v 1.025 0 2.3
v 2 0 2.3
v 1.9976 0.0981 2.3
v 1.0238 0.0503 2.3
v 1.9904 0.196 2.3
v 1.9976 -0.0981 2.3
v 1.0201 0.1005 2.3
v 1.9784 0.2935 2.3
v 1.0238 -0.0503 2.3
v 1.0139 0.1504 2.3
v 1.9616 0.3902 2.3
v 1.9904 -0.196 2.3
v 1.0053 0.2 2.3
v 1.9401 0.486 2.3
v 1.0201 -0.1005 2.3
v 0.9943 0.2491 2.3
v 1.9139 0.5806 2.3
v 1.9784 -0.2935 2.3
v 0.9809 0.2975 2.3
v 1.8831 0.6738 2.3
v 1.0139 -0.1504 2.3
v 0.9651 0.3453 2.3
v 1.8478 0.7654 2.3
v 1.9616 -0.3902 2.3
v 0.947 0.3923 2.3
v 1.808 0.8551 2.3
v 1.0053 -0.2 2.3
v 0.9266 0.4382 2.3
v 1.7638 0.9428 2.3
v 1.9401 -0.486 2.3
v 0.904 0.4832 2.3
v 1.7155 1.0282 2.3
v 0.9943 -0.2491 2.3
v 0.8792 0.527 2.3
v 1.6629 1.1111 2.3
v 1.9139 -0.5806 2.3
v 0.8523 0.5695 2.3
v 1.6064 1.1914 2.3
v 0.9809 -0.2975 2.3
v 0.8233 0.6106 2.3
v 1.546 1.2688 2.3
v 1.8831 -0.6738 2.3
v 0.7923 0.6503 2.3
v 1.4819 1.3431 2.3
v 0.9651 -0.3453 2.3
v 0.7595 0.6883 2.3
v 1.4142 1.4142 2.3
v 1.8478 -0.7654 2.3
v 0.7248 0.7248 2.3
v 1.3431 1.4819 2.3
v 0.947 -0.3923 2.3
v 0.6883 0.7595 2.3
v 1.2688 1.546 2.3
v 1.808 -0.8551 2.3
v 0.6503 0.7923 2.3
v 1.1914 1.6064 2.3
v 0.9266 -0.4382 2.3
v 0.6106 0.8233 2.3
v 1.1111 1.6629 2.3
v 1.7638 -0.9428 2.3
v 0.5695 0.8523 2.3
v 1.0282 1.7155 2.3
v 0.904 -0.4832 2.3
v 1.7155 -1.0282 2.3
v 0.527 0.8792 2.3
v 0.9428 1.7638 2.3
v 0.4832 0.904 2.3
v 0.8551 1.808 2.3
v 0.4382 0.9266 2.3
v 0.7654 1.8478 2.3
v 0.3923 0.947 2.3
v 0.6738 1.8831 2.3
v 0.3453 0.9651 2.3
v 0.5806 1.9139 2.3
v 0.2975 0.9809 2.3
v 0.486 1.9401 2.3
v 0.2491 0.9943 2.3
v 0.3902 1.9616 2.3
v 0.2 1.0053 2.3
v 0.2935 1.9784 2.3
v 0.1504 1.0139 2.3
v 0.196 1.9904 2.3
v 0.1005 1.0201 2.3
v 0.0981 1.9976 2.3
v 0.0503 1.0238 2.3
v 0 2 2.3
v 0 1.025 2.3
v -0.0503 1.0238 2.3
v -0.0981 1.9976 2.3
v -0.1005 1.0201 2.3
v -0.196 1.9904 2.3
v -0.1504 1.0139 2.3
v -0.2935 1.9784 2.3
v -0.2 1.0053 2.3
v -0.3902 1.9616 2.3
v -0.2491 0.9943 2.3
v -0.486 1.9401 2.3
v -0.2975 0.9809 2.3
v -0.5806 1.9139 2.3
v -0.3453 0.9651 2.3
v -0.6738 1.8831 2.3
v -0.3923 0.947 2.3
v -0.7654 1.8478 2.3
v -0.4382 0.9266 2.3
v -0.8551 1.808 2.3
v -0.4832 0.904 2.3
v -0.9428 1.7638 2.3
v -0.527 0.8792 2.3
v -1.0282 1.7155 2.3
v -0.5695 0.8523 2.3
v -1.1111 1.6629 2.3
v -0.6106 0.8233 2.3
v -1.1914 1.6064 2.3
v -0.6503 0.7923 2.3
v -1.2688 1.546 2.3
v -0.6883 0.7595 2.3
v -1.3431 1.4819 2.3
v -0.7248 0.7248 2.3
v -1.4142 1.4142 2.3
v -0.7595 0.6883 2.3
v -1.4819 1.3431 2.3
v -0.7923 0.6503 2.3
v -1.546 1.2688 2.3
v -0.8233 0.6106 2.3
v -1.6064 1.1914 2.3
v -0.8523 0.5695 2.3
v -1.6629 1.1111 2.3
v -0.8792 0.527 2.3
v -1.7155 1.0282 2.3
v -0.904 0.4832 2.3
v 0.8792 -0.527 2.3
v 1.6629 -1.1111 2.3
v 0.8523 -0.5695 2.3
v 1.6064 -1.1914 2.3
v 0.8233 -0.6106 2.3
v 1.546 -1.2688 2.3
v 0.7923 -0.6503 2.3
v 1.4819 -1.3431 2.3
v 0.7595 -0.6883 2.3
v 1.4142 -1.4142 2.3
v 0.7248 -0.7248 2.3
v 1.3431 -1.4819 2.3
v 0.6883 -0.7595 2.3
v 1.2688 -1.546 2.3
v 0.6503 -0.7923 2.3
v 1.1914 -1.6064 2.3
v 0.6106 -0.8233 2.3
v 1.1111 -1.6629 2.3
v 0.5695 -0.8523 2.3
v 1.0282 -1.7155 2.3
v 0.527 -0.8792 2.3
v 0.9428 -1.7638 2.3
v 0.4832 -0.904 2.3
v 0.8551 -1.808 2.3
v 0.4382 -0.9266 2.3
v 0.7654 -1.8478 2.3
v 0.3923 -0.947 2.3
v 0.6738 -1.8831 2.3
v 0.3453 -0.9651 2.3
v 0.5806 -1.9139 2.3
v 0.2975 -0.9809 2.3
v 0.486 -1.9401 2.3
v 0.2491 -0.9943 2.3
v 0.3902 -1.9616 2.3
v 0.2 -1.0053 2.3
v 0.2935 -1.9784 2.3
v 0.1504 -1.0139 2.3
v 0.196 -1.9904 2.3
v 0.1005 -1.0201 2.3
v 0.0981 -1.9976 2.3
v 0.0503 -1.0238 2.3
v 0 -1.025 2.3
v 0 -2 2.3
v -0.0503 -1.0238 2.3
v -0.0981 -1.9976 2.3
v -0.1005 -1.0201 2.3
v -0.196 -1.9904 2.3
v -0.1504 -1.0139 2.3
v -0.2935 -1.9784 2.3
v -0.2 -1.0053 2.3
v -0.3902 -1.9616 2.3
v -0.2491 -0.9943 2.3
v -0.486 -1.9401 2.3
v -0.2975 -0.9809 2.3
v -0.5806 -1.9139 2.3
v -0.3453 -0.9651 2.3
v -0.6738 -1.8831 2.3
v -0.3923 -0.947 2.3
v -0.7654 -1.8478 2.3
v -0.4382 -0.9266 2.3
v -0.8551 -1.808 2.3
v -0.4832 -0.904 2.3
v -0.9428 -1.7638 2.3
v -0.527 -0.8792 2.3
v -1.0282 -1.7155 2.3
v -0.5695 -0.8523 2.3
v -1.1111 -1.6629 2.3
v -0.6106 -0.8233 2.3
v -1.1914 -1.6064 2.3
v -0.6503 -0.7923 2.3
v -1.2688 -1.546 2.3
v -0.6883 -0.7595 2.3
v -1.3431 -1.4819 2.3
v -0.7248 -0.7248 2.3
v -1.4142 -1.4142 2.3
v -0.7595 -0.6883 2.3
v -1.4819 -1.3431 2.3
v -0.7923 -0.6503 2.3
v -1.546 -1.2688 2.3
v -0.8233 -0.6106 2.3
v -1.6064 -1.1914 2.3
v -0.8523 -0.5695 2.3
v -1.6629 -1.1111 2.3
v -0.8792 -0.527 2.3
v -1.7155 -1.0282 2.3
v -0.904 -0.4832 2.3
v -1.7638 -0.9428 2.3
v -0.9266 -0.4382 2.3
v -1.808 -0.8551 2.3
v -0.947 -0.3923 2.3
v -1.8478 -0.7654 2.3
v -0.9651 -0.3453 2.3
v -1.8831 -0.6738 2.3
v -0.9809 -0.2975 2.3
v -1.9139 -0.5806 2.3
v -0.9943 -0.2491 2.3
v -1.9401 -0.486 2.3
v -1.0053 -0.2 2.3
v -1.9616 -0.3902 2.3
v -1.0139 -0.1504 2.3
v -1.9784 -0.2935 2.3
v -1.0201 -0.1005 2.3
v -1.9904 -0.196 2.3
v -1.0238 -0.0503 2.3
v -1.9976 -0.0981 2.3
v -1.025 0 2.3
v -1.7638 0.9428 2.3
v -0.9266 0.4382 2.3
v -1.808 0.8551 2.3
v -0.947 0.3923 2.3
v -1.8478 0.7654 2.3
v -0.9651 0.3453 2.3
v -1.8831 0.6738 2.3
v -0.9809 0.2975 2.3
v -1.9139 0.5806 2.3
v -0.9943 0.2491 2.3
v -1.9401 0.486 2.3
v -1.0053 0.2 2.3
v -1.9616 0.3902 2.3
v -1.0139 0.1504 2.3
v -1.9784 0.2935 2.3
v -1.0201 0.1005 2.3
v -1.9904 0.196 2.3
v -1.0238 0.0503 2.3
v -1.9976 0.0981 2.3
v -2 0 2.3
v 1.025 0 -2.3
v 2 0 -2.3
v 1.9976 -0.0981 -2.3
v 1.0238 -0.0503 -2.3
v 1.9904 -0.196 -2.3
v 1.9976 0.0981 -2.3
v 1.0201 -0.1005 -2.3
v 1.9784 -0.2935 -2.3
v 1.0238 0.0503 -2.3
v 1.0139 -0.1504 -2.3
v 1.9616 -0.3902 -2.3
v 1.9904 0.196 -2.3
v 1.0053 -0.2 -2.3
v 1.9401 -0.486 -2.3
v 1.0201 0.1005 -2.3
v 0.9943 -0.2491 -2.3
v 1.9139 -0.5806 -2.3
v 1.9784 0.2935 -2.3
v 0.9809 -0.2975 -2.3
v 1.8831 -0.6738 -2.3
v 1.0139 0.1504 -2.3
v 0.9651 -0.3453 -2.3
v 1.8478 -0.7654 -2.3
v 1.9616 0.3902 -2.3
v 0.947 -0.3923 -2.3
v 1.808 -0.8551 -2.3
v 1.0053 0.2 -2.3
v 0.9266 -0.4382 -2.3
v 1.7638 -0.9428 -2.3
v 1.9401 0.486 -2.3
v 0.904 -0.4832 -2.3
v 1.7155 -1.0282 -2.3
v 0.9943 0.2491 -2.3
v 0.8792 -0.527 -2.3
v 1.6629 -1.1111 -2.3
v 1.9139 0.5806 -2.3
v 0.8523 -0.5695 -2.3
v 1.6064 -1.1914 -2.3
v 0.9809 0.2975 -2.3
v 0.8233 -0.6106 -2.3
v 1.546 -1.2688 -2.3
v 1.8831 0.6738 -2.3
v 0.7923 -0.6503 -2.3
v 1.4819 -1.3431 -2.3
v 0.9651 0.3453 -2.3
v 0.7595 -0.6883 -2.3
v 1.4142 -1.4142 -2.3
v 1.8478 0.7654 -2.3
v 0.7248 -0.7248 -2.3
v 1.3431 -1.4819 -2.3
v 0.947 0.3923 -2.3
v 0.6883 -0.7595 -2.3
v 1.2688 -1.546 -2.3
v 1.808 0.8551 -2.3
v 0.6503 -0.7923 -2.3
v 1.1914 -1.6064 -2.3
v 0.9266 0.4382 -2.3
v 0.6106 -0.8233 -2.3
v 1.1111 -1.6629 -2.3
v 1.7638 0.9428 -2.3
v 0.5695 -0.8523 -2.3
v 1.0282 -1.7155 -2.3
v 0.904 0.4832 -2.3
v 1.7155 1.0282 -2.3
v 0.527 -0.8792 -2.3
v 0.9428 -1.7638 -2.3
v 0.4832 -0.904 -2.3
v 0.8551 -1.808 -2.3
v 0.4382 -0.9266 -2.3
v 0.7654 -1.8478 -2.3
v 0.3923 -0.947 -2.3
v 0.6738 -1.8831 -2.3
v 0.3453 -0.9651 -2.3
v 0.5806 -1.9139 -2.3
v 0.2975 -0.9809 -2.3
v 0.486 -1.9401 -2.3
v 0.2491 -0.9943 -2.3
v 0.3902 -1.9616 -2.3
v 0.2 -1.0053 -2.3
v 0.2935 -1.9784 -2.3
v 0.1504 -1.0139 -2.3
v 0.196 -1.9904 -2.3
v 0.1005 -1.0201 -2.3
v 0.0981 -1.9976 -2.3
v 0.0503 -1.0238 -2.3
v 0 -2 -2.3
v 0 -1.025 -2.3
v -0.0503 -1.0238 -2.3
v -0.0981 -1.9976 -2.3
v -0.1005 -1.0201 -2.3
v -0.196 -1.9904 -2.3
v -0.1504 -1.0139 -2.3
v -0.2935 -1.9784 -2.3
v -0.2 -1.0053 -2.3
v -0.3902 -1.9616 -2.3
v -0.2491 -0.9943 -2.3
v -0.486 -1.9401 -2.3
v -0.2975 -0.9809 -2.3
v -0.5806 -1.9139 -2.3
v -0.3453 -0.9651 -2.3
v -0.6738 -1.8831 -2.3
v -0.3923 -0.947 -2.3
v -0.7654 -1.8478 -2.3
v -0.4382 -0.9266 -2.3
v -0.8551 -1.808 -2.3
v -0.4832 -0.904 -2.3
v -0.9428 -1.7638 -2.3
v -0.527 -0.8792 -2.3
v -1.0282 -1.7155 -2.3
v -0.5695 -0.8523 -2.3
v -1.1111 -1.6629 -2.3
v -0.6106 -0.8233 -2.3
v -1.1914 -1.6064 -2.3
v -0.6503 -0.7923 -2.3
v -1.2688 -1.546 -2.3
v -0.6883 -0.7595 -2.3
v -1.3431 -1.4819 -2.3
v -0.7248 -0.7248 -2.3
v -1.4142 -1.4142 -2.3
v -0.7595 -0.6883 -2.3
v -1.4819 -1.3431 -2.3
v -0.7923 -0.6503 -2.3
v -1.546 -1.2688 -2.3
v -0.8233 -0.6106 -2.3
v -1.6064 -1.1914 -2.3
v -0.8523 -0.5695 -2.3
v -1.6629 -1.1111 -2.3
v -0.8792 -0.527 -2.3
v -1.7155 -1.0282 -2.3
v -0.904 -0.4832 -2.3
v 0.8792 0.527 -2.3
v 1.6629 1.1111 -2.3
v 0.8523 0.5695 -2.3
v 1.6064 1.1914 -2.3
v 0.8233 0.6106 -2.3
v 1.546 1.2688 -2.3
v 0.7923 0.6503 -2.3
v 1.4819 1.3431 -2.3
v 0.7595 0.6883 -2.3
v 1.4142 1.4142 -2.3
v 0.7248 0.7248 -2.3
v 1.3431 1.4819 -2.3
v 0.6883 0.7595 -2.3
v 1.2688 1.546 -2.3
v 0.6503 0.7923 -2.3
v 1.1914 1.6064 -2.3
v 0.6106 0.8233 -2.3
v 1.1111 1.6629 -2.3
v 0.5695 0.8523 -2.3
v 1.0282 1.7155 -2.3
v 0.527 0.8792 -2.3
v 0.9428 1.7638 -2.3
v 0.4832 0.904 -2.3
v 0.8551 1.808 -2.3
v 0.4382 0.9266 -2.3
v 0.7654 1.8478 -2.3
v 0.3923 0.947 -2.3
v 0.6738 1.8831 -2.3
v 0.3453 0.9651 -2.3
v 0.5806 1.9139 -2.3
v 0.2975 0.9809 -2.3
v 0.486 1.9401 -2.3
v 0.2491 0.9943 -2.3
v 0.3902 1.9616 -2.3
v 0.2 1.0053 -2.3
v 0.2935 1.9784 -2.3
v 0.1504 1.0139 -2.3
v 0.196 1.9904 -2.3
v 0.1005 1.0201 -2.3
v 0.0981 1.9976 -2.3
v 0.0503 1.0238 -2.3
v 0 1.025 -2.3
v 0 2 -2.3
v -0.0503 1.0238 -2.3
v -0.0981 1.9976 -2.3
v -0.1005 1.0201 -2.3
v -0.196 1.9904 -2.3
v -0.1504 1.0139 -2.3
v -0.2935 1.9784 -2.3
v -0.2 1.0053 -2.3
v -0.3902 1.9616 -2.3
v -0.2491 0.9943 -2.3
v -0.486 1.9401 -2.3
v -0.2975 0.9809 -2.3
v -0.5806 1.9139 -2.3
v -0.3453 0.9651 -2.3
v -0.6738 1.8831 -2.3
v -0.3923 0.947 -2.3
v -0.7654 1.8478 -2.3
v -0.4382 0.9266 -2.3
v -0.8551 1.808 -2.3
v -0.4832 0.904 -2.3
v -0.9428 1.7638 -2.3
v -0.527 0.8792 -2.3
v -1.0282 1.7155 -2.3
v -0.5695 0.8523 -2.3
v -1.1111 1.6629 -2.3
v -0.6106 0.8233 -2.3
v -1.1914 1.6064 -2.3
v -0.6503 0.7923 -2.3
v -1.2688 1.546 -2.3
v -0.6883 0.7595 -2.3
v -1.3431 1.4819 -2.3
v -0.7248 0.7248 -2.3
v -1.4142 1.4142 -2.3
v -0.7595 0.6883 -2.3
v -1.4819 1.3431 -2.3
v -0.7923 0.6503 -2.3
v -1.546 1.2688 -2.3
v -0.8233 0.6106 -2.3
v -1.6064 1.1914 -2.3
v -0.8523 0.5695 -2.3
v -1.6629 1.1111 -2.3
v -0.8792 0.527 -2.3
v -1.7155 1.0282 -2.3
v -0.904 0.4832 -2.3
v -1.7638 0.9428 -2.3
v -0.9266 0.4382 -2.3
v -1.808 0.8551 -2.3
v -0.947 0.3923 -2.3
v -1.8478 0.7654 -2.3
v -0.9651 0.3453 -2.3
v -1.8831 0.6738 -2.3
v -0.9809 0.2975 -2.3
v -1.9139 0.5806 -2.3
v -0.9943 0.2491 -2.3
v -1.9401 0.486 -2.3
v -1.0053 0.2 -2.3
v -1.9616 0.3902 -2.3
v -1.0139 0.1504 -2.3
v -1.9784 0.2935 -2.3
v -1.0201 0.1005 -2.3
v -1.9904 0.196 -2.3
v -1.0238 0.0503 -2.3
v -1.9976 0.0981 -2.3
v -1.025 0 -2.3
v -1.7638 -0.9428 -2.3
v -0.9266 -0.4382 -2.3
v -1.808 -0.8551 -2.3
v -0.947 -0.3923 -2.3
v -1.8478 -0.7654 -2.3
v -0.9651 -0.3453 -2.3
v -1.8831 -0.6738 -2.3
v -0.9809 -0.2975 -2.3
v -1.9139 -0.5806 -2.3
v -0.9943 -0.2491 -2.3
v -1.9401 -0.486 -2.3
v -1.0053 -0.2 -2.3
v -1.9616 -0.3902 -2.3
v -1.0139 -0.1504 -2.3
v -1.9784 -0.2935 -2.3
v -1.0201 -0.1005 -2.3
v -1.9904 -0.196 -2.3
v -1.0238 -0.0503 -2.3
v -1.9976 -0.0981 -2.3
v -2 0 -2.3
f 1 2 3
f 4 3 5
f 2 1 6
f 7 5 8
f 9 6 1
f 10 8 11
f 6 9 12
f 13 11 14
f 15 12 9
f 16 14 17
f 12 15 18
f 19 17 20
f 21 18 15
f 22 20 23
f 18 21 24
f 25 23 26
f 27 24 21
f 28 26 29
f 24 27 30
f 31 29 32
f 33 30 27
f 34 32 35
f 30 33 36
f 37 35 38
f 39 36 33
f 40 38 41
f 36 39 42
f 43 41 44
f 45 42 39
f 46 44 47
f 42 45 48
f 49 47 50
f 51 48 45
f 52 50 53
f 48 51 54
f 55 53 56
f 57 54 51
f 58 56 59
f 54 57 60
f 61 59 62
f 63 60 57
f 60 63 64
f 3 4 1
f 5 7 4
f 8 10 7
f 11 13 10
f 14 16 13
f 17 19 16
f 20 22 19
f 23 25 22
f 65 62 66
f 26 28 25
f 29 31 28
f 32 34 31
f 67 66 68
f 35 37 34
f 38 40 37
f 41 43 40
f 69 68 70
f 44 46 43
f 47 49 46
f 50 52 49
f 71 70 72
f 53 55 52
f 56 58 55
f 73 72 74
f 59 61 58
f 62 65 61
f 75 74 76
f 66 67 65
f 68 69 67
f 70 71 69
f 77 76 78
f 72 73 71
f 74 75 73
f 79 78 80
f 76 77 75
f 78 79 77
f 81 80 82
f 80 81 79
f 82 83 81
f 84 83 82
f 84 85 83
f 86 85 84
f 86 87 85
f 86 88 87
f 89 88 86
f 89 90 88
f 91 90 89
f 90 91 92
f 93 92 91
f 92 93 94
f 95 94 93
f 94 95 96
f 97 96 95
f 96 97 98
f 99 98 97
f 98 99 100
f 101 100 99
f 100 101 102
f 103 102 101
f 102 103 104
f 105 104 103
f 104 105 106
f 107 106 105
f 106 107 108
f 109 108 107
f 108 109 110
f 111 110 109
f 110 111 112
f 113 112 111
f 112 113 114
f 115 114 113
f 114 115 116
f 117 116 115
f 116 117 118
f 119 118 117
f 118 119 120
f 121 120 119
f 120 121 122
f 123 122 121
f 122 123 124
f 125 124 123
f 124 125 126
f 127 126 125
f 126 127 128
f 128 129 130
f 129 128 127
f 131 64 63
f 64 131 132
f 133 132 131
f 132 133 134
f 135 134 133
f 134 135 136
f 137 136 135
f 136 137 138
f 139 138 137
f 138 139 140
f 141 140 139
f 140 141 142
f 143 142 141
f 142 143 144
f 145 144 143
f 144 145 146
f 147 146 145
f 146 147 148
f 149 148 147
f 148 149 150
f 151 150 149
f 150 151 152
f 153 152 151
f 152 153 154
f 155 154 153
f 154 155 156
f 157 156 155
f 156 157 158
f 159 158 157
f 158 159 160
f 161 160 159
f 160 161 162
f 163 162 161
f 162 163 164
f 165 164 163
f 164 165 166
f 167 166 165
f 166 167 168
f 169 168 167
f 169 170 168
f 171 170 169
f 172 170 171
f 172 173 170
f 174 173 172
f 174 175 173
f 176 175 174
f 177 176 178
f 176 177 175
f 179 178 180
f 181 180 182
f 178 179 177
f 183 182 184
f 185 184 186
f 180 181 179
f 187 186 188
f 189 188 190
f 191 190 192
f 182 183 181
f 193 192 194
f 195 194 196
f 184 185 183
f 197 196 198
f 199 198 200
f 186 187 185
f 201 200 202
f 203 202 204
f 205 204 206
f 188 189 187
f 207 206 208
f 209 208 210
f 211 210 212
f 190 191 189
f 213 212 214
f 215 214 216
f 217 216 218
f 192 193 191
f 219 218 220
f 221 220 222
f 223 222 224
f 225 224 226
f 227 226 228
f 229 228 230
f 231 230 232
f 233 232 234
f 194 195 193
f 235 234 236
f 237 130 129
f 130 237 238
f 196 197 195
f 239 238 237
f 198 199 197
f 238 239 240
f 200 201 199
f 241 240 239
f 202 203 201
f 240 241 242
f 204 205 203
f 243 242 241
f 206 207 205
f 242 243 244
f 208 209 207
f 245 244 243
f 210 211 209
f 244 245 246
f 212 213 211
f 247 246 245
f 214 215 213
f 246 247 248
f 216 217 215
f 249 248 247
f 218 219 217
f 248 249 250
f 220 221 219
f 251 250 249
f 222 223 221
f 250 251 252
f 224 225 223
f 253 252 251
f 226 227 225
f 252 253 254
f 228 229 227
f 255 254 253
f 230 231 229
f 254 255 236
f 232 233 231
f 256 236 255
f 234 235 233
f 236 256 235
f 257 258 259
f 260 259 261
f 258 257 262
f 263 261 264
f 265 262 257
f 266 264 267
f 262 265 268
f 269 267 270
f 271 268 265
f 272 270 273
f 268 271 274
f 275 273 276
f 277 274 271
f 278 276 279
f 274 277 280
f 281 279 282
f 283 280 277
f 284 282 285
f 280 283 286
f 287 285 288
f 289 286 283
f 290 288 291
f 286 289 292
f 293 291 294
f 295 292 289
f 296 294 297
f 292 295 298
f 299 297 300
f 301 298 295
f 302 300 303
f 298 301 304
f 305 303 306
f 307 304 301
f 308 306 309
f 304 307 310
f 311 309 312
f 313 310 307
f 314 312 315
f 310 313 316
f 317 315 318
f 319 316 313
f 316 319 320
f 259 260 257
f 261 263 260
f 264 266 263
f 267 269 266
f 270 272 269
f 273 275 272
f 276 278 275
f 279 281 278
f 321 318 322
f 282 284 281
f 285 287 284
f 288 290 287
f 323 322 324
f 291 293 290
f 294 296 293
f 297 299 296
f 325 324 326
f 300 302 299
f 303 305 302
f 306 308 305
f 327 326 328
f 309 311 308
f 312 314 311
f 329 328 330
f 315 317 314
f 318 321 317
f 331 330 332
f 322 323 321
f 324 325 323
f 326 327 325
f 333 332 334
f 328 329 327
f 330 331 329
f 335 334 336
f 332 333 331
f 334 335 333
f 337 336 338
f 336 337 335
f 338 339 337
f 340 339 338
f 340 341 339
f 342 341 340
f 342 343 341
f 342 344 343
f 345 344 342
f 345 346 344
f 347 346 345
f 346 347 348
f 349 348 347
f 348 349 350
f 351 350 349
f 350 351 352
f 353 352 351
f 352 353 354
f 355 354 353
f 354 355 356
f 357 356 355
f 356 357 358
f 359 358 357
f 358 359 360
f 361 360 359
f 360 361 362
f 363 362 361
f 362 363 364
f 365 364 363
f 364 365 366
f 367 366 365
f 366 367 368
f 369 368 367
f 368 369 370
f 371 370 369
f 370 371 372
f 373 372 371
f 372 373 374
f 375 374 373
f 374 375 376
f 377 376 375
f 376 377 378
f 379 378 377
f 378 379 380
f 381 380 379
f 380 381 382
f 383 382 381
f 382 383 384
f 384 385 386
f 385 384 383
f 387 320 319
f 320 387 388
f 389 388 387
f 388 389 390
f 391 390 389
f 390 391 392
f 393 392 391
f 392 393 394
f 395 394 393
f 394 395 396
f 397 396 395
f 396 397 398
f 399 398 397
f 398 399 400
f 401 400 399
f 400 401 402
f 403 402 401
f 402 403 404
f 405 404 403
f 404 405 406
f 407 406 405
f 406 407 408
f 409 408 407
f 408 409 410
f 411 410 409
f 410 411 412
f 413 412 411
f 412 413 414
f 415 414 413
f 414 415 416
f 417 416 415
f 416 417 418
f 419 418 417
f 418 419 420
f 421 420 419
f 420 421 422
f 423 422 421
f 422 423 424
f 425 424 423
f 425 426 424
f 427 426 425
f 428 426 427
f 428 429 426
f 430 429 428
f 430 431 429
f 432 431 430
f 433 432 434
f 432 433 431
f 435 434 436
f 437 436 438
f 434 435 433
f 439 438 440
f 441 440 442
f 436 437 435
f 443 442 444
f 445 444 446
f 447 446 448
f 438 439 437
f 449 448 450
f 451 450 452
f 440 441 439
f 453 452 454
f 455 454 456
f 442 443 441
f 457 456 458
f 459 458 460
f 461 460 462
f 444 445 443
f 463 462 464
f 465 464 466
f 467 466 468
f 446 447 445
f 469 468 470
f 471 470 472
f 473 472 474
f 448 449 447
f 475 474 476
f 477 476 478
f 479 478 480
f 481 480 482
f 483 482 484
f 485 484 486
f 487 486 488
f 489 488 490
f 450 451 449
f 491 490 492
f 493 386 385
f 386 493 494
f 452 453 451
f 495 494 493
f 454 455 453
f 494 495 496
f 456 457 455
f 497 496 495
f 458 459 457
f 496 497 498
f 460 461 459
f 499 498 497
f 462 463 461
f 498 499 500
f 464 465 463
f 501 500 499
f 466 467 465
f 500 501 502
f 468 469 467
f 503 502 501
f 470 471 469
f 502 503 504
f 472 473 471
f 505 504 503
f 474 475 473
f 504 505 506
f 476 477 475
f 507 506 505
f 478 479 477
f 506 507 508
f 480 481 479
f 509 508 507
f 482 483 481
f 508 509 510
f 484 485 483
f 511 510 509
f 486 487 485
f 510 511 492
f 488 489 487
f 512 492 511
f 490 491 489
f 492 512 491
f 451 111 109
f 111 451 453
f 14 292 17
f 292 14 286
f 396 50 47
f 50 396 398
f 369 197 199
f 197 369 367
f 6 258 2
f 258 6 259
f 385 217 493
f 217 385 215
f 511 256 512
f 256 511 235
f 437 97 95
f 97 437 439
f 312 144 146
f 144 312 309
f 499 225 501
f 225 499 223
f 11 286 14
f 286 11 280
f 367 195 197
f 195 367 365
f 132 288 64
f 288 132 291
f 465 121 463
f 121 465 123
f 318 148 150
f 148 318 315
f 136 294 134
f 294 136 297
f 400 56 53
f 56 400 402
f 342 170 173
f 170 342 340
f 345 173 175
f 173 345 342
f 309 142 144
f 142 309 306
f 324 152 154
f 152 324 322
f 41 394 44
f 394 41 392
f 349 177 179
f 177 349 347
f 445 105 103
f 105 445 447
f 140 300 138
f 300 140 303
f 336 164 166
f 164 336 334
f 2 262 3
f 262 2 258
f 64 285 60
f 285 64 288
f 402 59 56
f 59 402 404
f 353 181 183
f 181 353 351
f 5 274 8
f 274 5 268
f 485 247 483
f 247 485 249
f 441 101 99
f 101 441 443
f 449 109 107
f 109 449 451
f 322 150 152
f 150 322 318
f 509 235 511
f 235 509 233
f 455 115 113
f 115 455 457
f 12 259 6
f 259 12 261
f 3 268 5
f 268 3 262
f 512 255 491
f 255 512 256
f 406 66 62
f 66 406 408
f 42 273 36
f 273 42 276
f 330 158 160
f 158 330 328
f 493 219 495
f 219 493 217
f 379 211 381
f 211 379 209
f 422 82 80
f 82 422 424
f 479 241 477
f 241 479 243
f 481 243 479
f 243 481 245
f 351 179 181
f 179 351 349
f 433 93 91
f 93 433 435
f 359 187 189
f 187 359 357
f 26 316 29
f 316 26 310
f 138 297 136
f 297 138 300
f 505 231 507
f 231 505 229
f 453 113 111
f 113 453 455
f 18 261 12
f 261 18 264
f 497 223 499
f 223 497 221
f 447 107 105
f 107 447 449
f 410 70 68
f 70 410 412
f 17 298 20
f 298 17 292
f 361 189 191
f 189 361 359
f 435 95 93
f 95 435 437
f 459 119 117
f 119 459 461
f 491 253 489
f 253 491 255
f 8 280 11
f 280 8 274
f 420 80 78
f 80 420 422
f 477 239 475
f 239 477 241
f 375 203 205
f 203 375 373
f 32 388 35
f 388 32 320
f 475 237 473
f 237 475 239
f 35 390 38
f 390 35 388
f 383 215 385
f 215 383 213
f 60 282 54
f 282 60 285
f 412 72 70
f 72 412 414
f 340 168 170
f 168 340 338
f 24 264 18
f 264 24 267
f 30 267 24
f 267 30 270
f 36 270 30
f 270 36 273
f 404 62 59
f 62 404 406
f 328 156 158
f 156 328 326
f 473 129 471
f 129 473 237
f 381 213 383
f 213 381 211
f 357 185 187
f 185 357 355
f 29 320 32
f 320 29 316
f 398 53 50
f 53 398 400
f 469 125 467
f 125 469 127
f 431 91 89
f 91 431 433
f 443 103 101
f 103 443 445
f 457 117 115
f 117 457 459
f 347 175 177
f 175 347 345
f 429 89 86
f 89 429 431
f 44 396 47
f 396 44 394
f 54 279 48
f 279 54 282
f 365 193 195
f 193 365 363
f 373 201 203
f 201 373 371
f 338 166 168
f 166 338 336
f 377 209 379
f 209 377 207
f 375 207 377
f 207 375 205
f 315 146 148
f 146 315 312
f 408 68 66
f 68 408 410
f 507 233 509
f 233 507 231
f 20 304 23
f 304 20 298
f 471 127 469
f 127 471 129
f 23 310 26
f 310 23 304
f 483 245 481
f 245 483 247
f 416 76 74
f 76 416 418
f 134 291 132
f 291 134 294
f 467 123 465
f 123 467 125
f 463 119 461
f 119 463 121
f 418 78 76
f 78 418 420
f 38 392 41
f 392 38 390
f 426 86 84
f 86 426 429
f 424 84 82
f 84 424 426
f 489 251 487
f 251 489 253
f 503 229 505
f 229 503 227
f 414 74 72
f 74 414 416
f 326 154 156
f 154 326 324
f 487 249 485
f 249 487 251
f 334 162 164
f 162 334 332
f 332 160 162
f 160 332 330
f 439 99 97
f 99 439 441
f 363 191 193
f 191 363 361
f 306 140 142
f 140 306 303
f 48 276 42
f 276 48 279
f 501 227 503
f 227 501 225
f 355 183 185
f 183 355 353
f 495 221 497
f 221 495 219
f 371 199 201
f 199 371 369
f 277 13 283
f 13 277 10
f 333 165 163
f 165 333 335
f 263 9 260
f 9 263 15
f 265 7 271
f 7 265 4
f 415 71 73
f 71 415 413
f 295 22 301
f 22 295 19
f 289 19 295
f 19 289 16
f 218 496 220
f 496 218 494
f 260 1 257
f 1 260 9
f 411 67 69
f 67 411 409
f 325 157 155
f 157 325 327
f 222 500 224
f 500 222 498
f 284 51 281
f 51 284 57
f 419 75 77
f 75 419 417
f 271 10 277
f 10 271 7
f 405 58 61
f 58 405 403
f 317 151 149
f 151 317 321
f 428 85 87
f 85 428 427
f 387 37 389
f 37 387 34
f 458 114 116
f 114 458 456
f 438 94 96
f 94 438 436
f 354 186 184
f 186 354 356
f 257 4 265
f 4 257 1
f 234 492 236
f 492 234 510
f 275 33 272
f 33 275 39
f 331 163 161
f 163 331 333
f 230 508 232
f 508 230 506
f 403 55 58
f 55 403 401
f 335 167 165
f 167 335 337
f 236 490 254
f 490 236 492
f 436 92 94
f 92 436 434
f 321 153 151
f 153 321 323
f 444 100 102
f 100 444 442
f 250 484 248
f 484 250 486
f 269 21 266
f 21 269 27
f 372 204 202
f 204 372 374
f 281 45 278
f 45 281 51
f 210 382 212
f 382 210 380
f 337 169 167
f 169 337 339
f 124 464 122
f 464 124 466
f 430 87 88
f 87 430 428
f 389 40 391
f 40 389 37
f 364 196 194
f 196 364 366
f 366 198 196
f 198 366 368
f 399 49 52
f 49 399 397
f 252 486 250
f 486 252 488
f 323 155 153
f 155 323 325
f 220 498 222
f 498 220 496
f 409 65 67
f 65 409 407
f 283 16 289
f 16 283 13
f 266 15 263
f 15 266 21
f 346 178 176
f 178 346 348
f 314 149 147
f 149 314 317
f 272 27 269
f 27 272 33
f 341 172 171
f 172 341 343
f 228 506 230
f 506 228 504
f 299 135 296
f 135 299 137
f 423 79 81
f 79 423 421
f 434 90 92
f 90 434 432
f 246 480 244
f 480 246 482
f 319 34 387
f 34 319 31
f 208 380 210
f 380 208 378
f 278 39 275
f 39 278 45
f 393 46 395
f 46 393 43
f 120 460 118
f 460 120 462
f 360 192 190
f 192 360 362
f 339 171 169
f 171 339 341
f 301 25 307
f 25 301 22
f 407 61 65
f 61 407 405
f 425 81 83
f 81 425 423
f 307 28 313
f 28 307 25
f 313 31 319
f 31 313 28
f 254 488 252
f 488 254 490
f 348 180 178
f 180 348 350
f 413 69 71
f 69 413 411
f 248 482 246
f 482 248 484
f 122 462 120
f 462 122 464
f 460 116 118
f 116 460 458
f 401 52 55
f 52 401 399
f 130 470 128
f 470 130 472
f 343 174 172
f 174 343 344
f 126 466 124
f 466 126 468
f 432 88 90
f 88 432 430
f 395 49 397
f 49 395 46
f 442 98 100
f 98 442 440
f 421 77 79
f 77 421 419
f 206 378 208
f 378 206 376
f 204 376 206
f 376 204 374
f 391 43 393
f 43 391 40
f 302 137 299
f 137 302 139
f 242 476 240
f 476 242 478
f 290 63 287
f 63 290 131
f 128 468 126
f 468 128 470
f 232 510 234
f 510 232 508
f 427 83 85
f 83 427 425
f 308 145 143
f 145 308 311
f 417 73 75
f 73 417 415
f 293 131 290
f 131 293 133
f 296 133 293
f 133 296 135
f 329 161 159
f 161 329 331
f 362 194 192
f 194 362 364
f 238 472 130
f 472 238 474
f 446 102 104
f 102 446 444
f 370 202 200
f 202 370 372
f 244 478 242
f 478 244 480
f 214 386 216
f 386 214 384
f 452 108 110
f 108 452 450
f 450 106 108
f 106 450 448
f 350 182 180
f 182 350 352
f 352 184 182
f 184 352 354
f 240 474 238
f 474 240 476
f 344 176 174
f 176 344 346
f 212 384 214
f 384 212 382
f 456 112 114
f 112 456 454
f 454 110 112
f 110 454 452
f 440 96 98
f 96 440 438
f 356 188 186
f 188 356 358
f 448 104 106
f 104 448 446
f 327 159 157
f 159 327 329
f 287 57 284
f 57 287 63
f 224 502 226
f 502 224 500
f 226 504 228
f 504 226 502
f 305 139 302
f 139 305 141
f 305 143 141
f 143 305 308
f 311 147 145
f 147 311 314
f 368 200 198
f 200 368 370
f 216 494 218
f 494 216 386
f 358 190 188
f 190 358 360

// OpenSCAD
// Threaded heat-set insert (simple cylinder)
// Spec: 4.0mm outer diameter, 4.6mm long, for M2.5 screws
// One connected solid, no flange/countersink head.

$fn = 128;

// --- Parameters (spec) ---
od = 4.0;                 // outer diameter (mm)
L  = 4.6;                 // length (mm)

// M2.5 internal thread (visual approximation)
thread_pitch = 0.45;      // M2.5 coarse pitch (mm)
minor_d = 2.05;           // approximate minor diameter / tap drill (mm)

// Small lead-in chamfers (not a head/flange)
end_chamfer = 0.15;       // mm (kept small to avoid "countersunk head" look)

// Visual thread controls
show_internal_thread = true;
thread_depth = 0.18;      // radial depth of visual thread (mm)
thread_profile_w = 0.22;  // thickness of visual thread ridge (mm)

// Robust boolean overlap
eps = 0.02;

// --- Helpers ---
function clamp(x,a,b) = min(max(x,a),b);

// Outer body: simple cylinder with tiny end chamfers
module outer_body() {
  ch = clamp(end_chamfer, 0, L/2 - eps);

  union() {
    // Main cylinder
    cylinder(h=L, r=od/2, center=true);

    // Tiny chamfer at top (subtract later via intersection-like add? easier: add small frustum)
    // Here we "shape" by adding frustums that do not exceed OD (no flange).
    if (ch > 0) {
      translate([0,0, L/2 - ch/2])
        cylinder(h=ch, r1=od/2 - ch, r2=od/2, center=true);
      translate([0,0,-L/2 + ch/2])
        cylinder(h=ch, r1=od/2, r2=od/2 - ch, center=true);
    }
  }
}

// Internal bore (minor diameter) through
module internal_bore() {
  cylinder(h=L + 2*eps, r=minor_d/2, center=true);
}

// Visual internal thread: subtract a helical ridge from the bore
module internal_thread_visual() {
  r_bore = minor_d/2;
  r_thread = max(0.01, r_bore - thread_depth);

  // Keep thread away from ends a bit
  z0 = -L/2 + end_chamfer + 0.10;
  z1 =  L/2 - end_chamfer - 0.10;
  th = max(0, z1 - z0);

  if (th > 0) {
    translate([0,0,z0])
      linear_extrude(
        height = th,
        twist  = -360 * (th / thread_pitch),
        slices = max(60, ceil(th / (thread_pitch/16)))
      )
        translate([r_thread, 0, 0])
          square([thread_profile_w, thread_profile_w], center=true);
  }
}

// Final model
difference() {
  outer_body();
  internal_bore();
  if (show_internal_thread) internal_thread_visual();
}
